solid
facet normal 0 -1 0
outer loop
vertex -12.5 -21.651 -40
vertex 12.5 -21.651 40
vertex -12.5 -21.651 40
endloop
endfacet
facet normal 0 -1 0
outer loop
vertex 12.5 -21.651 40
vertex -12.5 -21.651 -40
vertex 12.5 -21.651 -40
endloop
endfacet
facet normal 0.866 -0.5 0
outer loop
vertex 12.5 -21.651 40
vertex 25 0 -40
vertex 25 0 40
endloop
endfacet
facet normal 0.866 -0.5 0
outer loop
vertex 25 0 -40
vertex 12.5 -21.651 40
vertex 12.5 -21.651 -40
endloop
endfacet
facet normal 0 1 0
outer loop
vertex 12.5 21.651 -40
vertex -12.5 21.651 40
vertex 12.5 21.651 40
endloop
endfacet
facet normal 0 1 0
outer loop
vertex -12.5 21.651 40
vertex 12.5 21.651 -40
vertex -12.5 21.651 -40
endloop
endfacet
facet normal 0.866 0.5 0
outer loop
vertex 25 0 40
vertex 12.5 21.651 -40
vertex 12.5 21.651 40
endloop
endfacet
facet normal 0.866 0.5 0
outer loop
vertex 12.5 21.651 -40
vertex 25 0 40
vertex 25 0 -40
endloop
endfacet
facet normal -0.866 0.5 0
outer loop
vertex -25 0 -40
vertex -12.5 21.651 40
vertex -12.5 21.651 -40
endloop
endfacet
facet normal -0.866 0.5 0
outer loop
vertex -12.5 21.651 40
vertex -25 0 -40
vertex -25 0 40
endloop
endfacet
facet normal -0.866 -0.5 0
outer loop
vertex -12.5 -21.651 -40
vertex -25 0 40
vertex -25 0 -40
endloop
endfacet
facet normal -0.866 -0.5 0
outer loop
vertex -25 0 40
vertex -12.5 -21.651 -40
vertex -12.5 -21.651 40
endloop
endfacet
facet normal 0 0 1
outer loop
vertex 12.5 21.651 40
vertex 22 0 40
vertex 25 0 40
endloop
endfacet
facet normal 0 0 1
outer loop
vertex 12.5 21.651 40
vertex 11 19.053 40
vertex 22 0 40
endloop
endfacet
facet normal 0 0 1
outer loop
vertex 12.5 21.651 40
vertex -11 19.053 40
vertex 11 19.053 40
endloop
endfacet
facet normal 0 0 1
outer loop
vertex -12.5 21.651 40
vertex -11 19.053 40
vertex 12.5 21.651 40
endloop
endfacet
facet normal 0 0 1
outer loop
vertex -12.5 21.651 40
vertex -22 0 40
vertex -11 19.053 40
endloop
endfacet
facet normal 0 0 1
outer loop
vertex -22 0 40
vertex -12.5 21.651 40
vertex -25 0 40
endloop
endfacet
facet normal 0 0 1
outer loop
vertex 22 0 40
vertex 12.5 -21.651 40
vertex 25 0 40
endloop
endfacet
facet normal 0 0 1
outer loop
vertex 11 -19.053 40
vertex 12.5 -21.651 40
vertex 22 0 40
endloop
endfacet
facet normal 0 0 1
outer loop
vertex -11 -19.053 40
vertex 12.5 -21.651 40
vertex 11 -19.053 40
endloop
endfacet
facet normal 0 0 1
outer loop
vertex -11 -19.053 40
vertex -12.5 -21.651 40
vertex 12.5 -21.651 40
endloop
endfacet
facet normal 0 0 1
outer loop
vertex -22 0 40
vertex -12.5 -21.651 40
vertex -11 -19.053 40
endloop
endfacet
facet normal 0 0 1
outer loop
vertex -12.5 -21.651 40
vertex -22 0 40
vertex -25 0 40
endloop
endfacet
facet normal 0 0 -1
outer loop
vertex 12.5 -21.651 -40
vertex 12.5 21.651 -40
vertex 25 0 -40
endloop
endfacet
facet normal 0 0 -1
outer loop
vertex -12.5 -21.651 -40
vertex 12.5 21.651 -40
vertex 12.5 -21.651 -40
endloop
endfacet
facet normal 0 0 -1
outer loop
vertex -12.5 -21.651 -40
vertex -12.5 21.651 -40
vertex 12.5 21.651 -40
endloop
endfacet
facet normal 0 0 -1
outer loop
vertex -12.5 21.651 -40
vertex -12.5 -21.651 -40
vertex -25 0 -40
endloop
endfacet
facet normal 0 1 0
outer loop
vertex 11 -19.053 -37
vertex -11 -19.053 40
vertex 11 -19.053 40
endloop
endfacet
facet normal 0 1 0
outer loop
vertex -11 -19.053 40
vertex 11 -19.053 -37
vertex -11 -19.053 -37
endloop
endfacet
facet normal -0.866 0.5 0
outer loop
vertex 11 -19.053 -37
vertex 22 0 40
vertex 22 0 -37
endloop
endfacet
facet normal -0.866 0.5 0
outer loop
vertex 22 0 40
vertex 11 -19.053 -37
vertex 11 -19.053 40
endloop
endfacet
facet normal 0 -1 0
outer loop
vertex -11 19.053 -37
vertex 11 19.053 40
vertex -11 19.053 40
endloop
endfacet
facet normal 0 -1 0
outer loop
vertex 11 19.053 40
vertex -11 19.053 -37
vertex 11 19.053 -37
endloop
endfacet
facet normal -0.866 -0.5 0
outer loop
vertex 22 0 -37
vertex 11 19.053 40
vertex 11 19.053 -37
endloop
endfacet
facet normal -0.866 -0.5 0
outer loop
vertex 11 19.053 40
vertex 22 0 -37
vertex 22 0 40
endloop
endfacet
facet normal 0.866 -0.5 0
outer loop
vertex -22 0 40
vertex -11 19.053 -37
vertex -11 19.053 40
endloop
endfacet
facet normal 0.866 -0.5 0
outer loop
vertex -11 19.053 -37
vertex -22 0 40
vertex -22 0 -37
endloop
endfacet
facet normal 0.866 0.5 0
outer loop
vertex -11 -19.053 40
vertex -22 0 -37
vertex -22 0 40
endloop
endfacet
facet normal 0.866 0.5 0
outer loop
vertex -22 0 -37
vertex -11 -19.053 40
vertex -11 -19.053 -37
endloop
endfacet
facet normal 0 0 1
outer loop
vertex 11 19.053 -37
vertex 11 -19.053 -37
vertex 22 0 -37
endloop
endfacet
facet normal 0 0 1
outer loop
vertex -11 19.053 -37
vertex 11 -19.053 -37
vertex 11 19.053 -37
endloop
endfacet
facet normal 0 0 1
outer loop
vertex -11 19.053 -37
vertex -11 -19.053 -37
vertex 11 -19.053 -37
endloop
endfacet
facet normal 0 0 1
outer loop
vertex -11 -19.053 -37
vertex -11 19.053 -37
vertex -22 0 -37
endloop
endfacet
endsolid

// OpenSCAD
//..Parametric Portalápices Poligonal. Test Customizer Thingiverse by www.Bioplastic3d.es


diametro=50;
altura=80;
lados=6;
grosor=3;


difference (){
cylinder(r=diametro/2,h=altura,center=true,$fn=lados);

translate([0,0,grosor])
	cylinder(r=diametro/2-grosor,h=altura,center=true,$fn=lados);
}


